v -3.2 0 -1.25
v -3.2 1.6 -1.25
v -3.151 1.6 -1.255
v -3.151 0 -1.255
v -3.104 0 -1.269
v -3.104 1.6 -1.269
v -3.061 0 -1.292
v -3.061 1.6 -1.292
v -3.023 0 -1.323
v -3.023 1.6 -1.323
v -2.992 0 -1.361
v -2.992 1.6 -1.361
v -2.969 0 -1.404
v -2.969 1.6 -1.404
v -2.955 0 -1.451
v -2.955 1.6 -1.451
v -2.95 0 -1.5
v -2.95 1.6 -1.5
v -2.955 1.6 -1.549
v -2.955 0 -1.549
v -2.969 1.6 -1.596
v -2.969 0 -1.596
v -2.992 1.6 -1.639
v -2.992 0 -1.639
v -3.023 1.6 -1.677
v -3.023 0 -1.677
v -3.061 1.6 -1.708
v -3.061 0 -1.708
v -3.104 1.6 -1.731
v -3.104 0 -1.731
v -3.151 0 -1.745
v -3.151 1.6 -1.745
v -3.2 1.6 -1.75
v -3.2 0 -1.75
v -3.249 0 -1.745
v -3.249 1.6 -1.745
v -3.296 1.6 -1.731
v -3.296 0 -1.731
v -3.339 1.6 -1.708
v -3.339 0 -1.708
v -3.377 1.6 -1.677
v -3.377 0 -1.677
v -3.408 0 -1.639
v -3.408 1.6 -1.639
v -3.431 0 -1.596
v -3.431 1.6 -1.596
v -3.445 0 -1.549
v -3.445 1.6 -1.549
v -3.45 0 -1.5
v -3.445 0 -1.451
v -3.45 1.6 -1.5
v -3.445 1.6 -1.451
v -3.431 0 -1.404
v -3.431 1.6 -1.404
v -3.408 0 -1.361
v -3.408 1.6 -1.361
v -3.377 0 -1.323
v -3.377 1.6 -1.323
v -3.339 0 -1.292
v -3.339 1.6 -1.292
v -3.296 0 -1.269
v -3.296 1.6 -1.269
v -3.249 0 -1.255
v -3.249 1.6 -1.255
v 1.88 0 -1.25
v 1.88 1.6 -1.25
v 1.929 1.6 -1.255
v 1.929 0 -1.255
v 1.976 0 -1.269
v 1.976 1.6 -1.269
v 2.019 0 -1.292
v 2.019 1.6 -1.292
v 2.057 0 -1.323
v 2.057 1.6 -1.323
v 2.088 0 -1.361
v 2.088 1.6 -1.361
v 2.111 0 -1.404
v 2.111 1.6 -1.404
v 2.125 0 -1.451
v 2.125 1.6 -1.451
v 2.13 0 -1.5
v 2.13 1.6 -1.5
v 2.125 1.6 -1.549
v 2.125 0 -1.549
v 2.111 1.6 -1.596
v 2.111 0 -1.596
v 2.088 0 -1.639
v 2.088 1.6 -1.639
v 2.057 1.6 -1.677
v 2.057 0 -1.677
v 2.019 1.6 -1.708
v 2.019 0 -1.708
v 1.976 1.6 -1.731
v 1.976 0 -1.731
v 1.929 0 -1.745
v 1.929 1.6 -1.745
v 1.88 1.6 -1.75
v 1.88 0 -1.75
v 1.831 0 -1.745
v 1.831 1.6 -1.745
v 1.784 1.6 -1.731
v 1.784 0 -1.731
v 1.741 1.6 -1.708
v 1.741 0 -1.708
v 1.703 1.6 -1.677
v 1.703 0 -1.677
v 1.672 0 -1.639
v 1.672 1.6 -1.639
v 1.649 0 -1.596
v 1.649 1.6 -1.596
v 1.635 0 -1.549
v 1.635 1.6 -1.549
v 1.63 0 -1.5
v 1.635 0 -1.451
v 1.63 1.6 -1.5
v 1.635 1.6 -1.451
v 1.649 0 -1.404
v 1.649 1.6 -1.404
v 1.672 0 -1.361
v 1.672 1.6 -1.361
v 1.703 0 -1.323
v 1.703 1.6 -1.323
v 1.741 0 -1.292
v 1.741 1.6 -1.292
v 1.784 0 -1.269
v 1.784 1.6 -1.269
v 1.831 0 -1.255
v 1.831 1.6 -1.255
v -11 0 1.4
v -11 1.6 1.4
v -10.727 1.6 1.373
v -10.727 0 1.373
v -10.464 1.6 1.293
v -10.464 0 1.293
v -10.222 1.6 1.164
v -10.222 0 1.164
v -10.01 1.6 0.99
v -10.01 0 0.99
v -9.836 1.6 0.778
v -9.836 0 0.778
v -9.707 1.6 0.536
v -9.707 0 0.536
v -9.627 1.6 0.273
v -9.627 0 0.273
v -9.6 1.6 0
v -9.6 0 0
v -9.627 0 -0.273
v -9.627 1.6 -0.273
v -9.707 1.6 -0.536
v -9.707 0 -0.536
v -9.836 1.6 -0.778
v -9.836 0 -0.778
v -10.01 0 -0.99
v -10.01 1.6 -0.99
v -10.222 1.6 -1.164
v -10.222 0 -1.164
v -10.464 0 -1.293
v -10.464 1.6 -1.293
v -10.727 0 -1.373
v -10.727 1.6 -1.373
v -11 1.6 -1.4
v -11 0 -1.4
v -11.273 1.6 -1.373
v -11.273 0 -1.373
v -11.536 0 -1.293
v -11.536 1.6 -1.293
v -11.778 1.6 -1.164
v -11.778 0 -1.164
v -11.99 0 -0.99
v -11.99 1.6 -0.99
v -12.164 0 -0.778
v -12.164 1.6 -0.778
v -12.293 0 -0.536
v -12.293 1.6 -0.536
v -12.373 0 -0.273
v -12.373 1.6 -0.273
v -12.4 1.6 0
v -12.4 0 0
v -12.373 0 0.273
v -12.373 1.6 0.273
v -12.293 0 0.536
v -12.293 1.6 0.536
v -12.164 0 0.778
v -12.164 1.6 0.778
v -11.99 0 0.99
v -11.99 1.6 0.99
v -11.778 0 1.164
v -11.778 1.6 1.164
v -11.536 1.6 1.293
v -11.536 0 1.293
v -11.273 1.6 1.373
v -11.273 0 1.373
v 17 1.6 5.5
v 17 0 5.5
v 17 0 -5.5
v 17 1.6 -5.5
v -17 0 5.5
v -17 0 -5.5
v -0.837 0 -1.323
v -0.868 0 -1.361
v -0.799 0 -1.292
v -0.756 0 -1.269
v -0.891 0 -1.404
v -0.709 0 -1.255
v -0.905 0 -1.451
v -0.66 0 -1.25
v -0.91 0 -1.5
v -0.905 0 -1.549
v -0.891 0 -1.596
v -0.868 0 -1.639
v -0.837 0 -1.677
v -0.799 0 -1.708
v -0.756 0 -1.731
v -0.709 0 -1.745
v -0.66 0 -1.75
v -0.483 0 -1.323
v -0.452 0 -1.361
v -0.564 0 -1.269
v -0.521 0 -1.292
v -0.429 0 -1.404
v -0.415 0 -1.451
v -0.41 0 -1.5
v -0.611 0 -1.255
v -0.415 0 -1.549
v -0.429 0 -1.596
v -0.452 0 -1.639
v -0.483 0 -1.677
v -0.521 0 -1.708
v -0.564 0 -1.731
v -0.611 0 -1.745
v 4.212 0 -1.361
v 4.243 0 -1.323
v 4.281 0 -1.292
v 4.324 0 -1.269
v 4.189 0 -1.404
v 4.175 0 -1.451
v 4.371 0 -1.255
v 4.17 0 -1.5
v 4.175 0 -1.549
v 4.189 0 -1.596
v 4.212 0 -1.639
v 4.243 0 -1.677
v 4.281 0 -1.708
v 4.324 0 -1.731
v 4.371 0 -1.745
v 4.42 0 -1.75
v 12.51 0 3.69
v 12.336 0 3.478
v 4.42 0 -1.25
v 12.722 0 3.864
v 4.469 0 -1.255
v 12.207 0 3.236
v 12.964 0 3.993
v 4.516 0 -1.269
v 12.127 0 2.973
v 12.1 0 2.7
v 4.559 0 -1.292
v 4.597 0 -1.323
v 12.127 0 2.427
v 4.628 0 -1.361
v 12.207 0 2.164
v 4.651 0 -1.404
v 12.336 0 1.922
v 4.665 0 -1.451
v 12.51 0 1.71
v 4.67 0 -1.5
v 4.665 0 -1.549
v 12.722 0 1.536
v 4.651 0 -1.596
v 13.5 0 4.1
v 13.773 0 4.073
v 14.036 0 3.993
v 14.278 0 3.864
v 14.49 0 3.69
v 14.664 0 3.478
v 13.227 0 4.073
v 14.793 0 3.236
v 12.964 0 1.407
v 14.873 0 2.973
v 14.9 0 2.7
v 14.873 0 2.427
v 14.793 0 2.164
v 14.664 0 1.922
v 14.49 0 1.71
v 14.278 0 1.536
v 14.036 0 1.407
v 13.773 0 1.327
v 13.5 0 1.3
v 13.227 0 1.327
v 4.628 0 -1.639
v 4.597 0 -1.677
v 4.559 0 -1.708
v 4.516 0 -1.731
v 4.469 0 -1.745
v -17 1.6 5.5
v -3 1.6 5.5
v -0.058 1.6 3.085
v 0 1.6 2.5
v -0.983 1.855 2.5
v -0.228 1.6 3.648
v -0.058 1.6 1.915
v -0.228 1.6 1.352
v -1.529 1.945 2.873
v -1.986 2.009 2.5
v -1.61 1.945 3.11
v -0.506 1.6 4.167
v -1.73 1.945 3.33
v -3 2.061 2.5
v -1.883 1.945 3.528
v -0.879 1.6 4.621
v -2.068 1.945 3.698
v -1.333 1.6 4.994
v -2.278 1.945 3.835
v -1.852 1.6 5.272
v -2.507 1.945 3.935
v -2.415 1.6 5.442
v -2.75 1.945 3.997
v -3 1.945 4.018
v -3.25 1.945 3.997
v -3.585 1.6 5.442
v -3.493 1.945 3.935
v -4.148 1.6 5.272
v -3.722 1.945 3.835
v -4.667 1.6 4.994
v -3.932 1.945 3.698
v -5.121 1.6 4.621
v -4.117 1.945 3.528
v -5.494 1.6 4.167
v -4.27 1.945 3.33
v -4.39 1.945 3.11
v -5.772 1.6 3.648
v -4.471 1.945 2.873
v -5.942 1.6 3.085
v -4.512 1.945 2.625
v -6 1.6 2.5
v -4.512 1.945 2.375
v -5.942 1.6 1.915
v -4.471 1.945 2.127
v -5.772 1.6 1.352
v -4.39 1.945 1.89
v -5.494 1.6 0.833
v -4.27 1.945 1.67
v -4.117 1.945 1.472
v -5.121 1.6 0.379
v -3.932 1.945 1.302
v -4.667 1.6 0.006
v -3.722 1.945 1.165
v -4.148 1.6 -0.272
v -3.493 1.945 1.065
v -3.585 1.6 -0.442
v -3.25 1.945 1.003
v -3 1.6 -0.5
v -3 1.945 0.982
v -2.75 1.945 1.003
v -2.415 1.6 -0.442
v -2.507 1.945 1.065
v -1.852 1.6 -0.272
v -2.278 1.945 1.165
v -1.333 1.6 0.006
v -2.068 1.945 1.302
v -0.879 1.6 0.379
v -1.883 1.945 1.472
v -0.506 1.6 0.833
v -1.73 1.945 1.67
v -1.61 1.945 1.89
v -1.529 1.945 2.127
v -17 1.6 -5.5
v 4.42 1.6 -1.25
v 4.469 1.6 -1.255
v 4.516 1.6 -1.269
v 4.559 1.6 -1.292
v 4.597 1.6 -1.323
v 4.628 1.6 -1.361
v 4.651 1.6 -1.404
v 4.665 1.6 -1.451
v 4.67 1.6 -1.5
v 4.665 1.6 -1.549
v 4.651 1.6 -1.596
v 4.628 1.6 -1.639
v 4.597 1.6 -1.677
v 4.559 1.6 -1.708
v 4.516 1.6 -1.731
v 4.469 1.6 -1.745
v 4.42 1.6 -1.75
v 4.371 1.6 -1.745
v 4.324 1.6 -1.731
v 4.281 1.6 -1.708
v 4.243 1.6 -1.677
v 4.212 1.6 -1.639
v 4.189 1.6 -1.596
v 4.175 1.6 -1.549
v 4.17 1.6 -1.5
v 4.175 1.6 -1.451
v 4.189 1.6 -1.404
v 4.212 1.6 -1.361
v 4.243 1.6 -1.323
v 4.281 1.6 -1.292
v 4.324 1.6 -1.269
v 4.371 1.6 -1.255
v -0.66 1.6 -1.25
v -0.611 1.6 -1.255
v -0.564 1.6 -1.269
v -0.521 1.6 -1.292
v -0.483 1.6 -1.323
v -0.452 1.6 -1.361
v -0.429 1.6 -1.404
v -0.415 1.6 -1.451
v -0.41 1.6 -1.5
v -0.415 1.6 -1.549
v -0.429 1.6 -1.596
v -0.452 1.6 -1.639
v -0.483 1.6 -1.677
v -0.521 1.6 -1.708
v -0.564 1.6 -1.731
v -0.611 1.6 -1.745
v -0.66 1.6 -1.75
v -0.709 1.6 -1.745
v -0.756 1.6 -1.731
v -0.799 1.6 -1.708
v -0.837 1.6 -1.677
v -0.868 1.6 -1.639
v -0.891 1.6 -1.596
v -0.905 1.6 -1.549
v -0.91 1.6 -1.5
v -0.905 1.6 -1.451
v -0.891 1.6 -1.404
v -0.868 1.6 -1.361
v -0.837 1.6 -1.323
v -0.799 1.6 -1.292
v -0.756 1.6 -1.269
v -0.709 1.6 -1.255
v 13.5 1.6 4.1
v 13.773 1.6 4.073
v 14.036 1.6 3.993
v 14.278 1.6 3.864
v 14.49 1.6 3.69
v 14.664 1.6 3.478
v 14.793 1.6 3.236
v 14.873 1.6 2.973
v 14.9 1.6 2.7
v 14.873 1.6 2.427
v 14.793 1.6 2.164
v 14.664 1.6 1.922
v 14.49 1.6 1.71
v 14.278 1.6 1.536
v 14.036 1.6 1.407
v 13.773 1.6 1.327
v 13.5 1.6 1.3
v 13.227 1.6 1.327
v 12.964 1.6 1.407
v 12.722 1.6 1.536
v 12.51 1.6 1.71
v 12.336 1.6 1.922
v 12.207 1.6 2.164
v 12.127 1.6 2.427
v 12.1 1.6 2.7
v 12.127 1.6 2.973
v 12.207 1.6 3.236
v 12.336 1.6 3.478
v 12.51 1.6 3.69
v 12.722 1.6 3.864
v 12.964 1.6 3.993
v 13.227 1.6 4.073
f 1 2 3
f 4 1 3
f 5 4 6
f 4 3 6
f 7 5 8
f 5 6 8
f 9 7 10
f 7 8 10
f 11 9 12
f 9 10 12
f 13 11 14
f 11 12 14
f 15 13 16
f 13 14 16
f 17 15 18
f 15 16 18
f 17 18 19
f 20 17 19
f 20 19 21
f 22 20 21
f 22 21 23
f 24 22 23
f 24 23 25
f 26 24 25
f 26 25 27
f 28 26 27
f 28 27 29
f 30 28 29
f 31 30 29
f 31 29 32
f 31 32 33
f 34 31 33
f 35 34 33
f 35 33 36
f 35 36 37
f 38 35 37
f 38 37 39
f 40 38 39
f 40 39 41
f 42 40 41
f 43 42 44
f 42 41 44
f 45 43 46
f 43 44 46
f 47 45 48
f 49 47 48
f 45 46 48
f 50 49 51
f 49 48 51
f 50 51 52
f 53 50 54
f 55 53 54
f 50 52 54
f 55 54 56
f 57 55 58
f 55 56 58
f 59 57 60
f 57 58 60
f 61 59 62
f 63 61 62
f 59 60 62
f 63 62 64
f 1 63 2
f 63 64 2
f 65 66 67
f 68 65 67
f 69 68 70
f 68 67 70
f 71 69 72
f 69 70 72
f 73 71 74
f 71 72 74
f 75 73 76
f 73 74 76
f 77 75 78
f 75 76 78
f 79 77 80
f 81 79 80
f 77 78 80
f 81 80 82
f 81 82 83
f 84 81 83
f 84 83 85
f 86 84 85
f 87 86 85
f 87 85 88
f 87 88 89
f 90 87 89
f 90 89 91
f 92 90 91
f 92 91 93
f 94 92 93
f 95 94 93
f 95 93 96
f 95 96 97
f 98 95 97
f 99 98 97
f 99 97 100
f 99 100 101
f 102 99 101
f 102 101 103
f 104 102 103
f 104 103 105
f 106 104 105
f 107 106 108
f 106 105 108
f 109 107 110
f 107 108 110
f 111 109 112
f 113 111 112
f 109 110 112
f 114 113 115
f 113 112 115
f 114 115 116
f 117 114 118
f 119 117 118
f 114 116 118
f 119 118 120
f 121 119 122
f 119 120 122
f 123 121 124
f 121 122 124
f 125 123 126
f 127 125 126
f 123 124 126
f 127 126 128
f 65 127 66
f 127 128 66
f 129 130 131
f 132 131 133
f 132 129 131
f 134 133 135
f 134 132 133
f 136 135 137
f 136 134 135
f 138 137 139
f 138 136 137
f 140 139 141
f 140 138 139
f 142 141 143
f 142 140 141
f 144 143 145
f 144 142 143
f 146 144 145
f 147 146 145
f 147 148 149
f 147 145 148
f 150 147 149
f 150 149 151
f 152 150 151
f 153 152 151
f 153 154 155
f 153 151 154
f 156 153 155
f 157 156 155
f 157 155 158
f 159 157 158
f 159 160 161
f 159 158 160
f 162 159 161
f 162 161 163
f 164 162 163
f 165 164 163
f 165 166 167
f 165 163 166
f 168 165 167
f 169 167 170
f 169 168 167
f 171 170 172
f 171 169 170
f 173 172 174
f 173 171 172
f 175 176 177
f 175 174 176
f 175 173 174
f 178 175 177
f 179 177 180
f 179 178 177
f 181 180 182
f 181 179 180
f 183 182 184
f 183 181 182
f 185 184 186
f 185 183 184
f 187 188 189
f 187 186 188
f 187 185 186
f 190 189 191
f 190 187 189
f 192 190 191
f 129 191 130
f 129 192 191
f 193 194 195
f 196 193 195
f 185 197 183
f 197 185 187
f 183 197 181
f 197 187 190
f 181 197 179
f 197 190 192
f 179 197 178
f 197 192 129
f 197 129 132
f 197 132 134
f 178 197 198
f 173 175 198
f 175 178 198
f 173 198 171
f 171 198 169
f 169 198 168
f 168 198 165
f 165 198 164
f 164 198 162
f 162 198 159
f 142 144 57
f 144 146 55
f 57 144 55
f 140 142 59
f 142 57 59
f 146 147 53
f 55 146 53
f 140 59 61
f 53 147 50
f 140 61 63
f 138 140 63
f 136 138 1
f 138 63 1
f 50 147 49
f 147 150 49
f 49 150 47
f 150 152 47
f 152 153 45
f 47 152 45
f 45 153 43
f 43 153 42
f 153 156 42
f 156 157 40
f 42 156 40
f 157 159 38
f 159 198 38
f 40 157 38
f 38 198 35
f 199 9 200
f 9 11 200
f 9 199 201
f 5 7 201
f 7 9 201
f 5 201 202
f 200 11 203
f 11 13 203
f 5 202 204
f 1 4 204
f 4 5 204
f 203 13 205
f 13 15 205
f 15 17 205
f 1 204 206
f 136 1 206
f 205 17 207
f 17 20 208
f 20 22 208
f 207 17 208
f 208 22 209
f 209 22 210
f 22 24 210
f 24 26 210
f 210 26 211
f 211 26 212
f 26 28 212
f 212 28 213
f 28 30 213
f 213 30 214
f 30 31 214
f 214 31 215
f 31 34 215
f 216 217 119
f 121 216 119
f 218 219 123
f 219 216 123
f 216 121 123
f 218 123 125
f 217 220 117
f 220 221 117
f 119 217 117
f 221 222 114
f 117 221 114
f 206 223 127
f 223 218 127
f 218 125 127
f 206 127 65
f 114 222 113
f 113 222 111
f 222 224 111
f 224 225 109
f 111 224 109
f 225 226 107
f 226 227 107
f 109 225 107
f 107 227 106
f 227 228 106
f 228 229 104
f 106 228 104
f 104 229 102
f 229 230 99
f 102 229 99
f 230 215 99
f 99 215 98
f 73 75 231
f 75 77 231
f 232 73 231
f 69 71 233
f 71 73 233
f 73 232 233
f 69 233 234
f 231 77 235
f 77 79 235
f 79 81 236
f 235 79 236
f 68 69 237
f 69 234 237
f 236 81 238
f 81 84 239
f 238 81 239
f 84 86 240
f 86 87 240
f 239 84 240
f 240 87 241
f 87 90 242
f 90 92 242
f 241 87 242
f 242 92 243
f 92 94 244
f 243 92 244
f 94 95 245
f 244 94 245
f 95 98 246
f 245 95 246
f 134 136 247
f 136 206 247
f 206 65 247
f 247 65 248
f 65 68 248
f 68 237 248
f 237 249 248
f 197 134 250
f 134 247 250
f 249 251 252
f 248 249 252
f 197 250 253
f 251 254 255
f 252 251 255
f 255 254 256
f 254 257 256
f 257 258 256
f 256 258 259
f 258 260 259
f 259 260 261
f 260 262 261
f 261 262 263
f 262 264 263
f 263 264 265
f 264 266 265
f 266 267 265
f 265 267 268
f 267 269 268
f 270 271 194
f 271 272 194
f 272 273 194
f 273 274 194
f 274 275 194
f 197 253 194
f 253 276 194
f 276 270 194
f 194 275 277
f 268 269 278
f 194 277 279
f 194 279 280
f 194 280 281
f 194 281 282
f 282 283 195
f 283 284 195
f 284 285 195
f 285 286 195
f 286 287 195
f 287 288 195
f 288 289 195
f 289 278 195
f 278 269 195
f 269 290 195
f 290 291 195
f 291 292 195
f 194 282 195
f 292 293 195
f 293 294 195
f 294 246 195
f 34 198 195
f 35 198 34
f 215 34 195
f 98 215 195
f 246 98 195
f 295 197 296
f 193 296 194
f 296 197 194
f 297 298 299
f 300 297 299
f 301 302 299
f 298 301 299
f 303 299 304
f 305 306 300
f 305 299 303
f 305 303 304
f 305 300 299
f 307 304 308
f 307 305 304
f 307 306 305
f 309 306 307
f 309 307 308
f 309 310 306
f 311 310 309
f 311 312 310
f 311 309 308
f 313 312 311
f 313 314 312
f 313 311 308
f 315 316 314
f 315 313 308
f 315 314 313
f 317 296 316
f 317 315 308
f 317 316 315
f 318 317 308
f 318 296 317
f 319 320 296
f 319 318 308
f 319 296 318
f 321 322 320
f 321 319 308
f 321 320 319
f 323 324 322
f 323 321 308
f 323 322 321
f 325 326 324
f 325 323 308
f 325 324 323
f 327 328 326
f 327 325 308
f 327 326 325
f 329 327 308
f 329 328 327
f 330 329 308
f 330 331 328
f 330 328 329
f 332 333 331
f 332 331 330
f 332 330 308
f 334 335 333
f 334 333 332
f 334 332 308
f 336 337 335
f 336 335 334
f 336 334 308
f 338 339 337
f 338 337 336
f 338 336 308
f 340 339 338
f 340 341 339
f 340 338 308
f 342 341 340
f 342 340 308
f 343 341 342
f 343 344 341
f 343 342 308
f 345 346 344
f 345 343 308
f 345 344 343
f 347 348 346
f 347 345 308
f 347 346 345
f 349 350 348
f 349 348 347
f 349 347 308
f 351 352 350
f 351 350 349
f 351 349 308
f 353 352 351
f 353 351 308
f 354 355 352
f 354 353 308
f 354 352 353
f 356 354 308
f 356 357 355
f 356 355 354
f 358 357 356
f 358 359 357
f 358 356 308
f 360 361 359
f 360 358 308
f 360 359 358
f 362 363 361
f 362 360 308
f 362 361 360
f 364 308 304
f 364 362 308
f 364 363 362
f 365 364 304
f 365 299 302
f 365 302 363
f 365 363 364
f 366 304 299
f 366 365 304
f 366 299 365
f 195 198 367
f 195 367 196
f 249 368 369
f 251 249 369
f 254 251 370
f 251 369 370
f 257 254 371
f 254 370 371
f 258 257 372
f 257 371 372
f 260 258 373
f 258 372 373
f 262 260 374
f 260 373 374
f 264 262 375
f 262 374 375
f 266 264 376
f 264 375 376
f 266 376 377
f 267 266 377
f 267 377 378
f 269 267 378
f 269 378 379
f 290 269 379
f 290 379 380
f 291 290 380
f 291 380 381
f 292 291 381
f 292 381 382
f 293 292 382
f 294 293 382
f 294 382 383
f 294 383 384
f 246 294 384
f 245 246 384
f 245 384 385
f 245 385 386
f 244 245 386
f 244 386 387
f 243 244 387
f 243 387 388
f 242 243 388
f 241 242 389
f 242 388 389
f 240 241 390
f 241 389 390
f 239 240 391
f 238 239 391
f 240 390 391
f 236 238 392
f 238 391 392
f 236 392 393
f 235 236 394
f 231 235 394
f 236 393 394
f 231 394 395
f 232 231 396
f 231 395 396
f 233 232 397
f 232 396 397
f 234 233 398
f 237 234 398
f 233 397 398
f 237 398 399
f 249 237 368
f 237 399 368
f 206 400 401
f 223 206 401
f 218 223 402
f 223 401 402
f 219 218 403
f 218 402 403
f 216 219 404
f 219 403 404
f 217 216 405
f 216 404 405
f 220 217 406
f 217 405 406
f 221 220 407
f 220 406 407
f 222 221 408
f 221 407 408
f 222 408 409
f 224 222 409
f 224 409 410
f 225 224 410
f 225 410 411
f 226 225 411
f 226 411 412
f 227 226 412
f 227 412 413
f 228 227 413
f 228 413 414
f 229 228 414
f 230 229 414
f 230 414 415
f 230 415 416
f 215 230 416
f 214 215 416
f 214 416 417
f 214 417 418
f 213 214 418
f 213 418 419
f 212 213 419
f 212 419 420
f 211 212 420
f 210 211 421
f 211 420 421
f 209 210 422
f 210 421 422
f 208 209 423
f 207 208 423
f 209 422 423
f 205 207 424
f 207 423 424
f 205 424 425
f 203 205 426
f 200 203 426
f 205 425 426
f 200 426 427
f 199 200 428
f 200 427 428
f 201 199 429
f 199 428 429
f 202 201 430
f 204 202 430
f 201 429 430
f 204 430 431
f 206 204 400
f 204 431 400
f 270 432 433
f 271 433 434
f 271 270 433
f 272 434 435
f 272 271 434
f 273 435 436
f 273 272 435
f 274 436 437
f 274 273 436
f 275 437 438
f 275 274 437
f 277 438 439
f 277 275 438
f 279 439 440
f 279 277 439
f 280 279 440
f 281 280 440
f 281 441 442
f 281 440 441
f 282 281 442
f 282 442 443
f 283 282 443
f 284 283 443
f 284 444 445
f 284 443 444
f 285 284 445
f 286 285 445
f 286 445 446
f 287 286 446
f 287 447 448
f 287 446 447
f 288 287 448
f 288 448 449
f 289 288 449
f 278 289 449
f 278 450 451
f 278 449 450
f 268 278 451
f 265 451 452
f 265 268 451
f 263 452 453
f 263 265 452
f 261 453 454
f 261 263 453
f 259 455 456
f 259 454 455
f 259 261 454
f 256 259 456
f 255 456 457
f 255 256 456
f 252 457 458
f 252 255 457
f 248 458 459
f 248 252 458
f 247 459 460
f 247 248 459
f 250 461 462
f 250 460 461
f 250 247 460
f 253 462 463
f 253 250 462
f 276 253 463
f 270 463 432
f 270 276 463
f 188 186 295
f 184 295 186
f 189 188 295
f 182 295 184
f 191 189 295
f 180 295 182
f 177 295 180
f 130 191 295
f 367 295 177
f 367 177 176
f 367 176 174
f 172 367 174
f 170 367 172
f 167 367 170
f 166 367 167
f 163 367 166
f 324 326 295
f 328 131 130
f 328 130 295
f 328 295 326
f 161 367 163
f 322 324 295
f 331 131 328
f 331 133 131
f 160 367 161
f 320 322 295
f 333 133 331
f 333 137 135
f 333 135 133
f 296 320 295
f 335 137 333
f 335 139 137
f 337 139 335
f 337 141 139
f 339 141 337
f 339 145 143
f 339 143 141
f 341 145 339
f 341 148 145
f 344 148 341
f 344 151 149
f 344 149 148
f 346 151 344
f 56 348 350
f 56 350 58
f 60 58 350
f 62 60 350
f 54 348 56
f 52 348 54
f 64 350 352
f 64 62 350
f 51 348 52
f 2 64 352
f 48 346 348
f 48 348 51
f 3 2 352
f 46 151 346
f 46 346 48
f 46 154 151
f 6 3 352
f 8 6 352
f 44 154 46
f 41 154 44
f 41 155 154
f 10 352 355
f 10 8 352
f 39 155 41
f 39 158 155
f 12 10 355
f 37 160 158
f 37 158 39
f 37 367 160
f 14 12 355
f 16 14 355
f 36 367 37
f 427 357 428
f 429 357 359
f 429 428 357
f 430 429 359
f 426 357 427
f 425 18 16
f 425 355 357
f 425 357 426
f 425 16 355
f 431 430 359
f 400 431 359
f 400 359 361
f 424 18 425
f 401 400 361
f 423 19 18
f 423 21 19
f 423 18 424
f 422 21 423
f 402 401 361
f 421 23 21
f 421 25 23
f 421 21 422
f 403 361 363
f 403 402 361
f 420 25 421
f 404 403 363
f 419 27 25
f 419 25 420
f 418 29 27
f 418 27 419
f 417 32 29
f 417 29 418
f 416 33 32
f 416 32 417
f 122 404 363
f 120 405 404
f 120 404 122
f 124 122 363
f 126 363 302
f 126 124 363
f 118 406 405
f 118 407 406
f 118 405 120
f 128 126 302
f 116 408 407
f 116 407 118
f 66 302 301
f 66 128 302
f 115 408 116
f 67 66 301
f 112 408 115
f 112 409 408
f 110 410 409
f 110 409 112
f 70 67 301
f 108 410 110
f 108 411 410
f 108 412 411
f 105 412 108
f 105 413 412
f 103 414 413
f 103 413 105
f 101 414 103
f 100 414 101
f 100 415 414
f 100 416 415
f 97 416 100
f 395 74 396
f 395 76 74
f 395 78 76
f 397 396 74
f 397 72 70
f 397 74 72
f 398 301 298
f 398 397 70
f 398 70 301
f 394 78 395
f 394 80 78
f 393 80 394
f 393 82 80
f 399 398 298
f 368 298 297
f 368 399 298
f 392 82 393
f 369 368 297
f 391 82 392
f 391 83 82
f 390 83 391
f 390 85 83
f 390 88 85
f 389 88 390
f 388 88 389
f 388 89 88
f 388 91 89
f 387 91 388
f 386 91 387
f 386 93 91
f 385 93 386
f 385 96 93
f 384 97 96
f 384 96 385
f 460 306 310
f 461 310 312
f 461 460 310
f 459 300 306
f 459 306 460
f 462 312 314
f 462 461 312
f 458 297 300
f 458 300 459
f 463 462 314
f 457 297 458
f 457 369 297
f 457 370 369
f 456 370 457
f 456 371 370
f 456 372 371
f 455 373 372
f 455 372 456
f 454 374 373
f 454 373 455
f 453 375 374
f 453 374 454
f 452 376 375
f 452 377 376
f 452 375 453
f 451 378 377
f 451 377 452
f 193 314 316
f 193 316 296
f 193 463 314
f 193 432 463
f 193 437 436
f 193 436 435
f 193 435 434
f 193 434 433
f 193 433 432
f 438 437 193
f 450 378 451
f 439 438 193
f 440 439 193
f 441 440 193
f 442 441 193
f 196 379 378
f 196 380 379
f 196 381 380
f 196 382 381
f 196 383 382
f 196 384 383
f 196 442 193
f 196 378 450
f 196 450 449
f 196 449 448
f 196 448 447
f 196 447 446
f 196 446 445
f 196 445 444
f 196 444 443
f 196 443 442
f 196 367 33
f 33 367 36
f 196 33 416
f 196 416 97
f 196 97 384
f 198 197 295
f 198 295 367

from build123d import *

# Parameters (mm, degrees)
SKETCH_1_W          = 34
SKETCH_1_H          = 11
EXTRUDE_1_DEPTH     = 1.6
SKETCH_2_R          = 1.4
CUT_EXTRUDE_2_DEPTH = 6.6
SKETCH_4_R          = 0.25
CUT_EXTRUDE_3_DEPTH = 10


with BuildPart() as part:
    # 草图1 → 拉伸1 (new body)
    with BuildSketch(Plane(origin=(0, 0, 0), x_dir=(1, 0, 0), z_dir=(0, 1, 0))):
        Rectangle(SKETCH_1_W, SKETCH_1_H)
    extrude(amount=EXTRUDE_1_DEPTH)

    # 草图2 → 切除-拉伸2 (cut)
    with BuildSketch(Plane(origin=(0, 0, 0), x_dir=(1, 0, 0), z_dir=(0, 1, 0))):
        with Locations(Location((-11, 0, 0), (0, 0, 270))):
            Circle(SKETCH_2_R)
        with Locations(Location((13.5, -2.7, 0), (0, 0, 270))):
            Circle(SKETCH_2_R)
    extrude(amount=CUT_EXTRUDE_2_DEPTH, mode=Mode.SUBTRACT)

    # 草图3 → 旋转1 (revolve)
    with BuildSketch(Plane.XY.offset(2.5)):
        with BuildLine():
            Line((0, 1.6), (-3, 1.6))
            Line((-3, 1.6), (-3, 2.060607986))
            ThreePointArc((-3, 2.060607986), (-1.482423007, 1.944785244), (0, 1.6))
        make_face()
    revolve(axis=Axis((-3, 10.072937712, 2.5), (0, -1, 0)))

    # 草图4 → 切除-拉伸3 (cut)
    with BuildSketch(Plane(origin=(0, 1.6, 0), x_dir=(-1, 0, 0), z_dir=(0, 1, 0))):
        with Locations(Location((3.2, -1.5, 0), (0, 0, 90))):
            Circle(SKETCH_4_R)
        with Locations(Location((0.66, -1.5, 0), (0, 0, 90))):
            Circle(SKETCH_4_R)
        with Locations(Location((-1.88, -1.5, 0), (0, 0, 90))):
            Circle(SKETCH_4_R)
        with Locations(Location((-4.42, -1.5, 0), (0, 0, 90))):
            Circle(SKETCH_4_R)
    extrude(amount=-CUT_EXTRUDE_3_DEPTH, mode=Mode.SUBTRACT)


solid = part.part
